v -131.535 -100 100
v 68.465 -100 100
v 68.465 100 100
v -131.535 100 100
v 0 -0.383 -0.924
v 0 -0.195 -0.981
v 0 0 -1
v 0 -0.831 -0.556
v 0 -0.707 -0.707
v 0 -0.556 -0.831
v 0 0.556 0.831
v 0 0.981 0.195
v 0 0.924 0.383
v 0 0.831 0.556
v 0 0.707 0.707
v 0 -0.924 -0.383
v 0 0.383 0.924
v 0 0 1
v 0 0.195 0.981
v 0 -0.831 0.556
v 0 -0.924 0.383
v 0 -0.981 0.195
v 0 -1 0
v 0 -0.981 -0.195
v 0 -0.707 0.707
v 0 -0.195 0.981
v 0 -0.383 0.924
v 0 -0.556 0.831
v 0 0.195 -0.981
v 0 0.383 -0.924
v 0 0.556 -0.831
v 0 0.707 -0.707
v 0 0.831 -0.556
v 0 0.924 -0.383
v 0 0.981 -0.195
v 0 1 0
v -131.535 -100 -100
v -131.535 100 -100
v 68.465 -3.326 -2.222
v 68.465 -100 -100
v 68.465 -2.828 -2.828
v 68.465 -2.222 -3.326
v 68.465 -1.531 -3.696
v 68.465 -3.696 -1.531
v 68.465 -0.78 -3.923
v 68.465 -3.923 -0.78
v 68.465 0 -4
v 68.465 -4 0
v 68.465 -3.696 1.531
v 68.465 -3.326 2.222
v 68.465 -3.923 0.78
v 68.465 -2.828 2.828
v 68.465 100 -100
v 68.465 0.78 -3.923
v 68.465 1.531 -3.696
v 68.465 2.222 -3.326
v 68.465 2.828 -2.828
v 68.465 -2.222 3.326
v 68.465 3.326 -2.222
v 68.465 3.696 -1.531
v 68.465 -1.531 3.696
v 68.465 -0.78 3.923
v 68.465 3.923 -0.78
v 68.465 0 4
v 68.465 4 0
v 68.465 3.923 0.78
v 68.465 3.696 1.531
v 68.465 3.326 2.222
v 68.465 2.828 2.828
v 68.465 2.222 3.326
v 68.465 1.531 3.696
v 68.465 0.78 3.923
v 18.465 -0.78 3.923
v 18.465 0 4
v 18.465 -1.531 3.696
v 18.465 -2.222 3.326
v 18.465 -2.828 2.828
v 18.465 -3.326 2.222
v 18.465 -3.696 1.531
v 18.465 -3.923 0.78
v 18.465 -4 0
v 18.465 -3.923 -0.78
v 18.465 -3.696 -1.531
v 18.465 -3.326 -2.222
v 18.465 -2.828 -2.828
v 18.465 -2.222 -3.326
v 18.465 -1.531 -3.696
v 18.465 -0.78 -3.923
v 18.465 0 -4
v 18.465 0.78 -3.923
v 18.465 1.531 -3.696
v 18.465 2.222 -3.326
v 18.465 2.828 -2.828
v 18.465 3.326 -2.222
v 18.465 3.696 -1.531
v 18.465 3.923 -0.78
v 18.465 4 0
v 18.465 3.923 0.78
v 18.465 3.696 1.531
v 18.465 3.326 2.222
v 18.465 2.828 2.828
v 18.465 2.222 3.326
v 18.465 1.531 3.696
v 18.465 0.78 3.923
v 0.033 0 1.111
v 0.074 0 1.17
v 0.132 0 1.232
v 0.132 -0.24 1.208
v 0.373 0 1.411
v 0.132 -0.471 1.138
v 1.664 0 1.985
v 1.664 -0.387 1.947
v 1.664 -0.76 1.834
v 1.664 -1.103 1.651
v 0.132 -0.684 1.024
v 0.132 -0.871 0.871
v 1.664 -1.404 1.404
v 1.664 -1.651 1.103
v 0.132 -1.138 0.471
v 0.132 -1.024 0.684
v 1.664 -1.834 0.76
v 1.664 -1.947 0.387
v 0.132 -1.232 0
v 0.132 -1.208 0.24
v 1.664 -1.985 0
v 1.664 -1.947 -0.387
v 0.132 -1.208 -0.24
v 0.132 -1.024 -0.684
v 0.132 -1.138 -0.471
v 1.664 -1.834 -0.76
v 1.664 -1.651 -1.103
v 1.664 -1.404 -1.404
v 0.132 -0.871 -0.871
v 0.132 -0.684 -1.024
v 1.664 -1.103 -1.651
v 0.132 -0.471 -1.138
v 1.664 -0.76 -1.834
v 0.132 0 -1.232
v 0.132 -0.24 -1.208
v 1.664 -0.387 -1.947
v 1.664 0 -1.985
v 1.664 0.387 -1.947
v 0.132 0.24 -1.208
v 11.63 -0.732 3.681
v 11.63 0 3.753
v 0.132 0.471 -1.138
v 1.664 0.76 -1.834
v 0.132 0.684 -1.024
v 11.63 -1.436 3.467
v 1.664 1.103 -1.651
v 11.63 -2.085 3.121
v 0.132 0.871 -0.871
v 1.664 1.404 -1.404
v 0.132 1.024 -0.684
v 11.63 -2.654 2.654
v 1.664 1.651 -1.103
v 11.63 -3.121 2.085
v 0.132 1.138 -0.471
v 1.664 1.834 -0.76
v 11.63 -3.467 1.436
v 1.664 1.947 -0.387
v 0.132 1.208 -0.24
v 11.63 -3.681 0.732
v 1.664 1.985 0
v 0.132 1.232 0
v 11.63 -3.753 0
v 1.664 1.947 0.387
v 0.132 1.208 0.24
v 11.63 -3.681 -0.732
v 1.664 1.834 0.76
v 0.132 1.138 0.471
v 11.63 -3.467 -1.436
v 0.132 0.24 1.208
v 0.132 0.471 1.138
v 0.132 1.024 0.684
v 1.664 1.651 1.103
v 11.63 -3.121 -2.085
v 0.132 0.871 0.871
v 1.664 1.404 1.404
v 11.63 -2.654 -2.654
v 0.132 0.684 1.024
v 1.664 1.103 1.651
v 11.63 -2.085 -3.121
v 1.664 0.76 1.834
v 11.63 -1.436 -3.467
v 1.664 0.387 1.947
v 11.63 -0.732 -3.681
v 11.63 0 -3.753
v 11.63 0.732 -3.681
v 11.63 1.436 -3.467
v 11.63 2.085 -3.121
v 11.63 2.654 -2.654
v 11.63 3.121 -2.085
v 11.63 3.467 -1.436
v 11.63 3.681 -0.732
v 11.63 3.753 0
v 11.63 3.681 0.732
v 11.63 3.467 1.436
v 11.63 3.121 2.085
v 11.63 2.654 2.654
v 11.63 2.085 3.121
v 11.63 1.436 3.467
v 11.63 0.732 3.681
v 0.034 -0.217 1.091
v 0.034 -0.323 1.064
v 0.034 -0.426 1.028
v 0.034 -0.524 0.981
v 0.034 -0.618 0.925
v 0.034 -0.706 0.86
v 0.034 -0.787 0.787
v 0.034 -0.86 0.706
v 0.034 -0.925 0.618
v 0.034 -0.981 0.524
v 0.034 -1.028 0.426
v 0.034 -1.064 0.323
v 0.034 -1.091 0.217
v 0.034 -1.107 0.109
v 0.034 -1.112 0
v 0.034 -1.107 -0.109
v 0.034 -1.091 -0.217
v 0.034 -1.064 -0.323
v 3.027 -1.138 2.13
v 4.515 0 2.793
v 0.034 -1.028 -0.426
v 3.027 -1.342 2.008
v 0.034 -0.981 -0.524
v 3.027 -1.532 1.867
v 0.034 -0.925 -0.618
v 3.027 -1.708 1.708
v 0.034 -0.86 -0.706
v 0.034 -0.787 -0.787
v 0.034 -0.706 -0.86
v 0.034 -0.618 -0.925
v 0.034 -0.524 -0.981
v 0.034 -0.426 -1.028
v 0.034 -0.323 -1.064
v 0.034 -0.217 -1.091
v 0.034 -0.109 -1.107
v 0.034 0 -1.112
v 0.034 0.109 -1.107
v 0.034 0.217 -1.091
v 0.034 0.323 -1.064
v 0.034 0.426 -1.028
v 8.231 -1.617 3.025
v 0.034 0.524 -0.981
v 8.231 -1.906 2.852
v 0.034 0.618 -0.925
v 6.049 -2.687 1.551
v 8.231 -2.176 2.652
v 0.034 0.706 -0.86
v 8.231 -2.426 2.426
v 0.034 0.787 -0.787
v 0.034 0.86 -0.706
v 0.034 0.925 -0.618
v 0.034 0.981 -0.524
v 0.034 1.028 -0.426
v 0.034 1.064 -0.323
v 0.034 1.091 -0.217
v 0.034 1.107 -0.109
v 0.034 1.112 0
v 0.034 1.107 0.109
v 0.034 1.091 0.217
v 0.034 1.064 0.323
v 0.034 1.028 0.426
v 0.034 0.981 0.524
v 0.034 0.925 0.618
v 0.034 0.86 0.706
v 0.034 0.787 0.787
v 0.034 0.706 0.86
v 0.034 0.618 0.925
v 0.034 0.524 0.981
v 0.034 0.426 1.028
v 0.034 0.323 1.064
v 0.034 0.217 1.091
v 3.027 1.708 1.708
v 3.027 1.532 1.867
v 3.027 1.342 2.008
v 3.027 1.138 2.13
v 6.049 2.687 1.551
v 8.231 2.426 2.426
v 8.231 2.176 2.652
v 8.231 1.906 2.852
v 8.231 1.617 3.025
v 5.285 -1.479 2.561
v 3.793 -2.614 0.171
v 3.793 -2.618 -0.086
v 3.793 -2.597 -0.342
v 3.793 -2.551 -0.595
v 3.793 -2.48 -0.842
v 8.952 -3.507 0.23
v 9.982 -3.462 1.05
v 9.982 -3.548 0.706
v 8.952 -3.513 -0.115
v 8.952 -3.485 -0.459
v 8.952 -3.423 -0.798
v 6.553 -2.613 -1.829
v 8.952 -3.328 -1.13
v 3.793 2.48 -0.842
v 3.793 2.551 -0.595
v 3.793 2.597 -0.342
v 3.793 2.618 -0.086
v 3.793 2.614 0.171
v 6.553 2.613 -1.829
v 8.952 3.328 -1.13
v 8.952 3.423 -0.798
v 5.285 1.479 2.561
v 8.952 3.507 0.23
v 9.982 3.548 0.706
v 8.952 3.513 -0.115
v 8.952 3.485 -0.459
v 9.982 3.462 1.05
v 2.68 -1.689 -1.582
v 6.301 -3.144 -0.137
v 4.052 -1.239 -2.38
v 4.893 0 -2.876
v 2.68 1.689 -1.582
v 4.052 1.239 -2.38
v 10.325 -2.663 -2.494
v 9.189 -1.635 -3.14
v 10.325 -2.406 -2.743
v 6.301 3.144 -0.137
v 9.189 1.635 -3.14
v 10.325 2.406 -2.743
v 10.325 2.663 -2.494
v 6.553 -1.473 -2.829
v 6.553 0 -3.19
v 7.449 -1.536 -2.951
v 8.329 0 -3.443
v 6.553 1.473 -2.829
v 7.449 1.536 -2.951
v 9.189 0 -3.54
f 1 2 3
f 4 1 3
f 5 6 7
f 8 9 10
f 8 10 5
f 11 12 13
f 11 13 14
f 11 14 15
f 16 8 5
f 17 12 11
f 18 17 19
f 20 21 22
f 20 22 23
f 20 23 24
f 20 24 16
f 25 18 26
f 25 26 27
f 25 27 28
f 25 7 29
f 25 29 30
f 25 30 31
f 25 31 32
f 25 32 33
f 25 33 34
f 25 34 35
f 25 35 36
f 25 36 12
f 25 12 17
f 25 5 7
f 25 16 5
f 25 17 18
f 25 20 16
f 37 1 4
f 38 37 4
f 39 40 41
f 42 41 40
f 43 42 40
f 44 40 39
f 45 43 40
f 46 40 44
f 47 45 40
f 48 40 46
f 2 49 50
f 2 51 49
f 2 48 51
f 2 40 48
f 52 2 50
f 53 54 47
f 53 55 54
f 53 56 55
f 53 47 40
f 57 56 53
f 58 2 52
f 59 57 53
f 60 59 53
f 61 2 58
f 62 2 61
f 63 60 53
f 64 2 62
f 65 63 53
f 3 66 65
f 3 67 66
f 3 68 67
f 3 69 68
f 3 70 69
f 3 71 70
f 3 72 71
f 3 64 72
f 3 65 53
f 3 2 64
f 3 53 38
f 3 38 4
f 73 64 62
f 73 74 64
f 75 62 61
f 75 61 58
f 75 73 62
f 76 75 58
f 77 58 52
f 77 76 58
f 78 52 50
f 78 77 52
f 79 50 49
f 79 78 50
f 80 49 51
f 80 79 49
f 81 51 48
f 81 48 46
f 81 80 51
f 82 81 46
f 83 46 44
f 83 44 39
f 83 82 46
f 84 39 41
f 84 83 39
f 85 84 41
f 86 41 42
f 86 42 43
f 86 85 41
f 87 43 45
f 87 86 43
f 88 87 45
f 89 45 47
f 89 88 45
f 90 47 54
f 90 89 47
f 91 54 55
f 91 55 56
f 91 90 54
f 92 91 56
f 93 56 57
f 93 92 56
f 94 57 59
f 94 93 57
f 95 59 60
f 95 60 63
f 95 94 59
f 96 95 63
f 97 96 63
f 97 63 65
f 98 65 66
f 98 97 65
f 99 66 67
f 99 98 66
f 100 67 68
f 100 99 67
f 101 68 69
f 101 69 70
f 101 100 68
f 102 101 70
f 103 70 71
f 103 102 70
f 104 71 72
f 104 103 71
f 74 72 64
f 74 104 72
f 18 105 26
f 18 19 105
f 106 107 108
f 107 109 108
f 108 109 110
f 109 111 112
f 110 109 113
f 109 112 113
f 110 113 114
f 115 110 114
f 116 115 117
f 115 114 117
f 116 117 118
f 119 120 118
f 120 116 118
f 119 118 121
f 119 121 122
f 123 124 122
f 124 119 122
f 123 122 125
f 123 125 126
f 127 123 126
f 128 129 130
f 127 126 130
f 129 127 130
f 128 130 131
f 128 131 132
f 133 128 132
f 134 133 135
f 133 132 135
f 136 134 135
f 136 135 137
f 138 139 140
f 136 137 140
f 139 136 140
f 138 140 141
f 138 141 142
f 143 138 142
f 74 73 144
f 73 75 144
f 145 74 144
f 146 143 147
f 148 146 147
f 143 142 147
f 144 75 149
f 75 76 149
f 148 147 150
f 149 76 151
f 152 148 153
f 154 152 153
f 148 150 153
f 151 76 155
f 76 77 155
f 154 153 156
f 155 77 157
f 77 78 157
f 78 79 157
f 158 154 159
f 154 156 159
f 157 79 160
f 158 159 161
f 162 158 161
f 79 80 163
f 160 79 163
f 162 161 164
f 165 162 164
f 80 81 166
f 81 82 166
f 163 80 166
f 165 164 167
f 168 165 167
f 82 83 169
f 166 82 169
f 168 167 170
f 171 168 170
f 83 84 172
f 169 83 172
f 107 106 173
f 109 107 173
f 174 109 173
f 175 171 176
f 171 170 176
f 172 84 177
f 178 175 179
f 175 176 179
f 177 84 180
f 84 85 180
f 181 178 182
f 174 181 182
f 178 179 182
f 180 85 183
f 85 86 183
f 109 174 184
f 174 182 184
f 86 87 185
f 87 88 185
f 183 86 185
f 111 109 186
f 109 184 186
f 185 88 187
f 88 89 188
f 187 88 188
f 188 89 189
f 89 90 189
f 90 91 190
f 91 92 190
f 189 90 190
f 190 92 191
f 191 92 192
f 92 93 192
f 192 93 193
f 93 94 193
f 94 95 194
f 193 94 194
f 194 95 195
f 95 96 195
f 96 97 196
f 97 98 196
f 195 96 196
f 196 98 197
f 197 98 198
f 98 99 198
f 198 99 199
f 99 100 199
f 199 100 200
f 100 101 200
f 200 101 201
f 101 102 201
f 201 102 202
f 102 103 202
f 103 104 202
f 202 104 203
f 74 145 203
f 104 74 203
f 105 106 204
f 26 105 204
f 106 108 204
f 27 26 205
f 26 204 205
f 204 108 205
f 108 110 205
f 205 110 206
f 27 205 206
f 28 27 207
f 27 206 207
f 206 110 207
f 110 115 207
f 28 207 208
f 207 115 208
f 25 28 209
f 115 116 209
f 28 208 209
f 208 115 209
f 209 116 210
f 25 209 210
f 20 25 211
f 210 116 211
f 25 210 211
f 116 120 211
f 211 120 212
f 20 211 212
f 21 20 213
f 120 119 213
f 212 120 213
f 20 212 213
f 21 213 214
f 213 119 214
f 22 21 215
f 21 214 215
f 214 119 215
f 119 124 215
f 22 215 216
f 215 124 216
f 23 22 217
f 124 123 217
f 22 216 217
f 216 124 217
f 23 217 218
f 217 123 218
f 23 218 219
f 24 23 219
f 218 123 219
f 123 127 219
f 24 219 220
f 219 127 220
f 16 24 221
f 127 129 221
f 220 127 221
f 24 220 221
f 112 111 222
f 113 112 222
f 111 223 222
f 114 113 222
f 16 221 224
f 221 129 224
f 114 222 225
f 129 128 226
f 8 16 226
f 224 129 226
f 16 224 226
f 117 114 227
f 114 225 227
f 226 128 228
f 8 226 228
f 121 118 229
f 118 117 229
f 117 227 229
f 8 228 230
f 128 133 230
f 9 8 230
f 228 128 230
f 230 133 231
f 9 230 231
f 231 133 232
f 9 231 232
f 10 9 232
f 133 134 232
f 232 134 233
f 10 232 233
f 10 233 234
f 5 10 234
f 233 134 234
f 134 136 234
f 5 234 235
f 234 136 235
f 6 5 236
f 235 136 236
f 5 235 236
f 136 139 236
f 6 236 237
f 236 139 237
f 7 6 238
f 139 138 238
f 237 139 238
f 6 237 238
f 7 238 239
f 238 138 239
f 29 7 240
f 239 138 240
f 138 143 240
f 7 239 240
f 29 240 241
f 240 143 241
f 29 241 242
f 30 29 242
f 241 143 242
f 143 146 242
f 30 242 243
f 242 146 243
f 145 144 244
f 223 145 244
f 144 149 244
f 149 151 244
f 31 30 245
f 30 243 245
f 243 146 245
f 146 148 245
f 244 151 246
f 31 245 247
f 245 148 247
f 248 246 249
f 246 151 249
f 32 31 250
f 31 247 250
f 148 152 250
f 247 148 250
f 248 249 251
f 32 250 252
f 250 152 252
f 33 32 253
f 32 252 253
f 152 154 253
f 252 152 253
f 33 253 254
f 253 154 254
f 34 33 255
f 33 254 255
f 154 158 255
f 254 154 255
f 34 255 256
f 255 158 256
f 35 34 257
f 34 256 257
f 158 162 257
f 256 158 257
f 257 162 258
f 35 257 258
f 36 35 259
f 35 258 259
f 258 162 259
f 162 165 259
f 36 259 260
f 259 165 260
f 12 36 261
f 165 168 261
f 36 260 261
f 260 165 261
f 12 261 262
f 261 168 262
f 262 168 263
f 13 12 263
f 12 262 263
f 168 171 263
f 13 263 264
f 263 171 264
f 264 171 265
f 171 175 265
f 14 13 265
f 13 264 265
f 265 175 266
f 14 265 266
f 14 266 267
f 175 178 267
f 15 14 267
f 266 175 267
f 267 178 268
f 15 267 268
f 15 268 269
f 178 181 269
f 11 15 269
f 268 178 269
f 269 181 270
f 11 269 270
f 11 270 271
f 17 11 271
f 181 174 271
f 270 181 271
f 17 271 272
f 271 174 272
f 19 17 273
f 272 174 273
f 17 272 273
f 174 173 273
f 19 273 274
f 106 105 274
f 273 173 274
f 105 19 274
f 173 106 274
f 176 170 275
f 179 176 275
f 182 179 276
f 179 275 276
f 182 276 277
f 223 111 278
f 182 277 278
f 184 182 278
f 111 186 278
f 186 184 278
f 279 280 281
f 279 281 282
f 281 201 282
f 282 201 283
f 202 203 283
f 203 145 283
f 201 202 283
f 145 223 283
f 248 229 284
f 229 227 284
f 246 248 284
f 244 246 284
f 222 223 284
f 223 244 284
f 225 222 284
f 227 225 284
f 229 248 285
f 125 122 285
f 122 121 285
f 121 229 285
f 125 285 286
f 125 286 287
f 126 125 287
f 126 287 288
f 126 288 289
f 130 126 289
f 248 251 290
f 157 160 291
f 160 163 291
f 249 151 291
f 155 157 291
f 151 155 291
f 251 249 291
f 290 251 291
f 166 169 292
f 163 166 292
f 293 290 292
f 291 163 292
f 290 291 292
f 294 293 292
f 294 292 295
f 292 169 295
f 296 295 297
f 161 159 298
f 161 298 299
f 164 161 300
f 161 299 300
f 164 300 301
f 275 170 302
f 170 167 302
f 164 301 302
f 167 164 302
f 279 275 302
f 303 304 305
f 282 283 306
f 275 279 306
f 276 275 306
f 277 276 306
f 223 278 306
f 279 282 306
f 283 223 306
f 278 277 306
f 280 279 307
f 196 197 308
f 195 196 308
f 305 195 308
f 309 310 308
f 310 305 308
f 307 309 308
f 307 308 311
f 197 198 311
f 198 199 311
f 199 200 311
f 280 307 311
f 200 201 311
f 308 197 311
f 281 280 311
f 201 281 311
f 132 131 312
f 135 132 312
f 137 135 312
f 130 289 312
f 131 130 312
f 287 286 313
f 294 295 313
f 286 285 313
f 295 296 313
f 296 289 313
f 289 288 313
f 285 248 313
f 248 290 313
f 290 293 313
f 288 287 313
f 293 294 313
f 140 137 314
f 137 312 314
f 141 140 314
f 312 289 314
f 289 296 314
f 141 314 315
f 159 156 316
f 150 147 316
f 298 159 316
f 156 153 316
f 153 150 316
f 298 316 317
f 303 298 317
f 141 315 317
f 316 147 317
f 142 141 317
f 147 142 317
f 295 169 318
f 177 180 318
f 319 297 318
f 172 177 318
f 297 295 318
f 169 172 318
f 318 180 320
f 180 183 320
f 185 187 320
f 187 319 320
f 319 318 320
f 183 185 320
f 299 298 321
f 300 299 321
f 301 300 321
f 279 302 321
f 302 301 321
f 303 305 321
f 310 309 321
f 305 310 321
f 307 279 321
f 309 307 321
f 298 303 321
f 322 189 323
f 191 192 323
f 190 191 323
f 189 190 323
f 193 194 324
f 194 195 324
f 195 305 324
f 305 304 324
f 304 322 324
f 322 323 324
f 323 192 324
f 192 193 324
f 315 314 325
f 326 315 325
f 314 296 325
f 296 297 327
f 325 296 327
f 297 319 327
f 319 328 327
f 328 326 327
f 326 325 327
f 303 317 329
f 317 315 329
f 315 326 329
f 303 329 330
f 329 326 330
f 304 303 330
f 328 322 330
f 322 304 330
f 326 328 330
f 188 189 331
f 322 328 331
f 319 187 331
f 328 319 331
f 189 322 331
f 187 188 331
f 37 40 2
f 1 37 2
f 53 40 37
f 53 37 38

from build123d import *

# Parameters (mm, degrees)
F2_W     = 200
F2_H     = 200
F3_DEPTH = 200


with BuildPart() as f1:
    # F0 (on Front) → F1 (revolve)
    with BuildSketch(Plane.XZ):
        with BuildLine():
            Line((0, 1), (0, 0))
            Line((0, 0), (68.4652712196, 0))
            Line((68.4652712196, 0), (68.4652712196, 4))
            Line((68.4652712196, 4), (18.4652712196, 4))
            add(Edge.make_bspline(
                [(0, 1), (0, 1.4895908086), (4.855393481, 3.1693086379), (11.9006269585, 3.8174499144), (15.5344579131, 4), (18.4652712196, 4)],
                knots=[0, 0, 0, 0, 0.2842765861, 0.6512741765, 1, 1, 1, 1], degree=3))
        make_face()
    revolve(axis=Axis((34.2326356098, 0, 0), (1, 0, 0)))


with BuildPart() as f3:
    # F2 (on face) → F3 (new body)
    with BuildSketch(Plane.YZ.offset(68.4652712196)):
        Rectangle(F2_W, F2_H)
    extrude(amount=-F3_DEPTH)

    # F4: cut F1
    add(f1.part, mode=Mode.SUBTRACT)


solid = f3.part
